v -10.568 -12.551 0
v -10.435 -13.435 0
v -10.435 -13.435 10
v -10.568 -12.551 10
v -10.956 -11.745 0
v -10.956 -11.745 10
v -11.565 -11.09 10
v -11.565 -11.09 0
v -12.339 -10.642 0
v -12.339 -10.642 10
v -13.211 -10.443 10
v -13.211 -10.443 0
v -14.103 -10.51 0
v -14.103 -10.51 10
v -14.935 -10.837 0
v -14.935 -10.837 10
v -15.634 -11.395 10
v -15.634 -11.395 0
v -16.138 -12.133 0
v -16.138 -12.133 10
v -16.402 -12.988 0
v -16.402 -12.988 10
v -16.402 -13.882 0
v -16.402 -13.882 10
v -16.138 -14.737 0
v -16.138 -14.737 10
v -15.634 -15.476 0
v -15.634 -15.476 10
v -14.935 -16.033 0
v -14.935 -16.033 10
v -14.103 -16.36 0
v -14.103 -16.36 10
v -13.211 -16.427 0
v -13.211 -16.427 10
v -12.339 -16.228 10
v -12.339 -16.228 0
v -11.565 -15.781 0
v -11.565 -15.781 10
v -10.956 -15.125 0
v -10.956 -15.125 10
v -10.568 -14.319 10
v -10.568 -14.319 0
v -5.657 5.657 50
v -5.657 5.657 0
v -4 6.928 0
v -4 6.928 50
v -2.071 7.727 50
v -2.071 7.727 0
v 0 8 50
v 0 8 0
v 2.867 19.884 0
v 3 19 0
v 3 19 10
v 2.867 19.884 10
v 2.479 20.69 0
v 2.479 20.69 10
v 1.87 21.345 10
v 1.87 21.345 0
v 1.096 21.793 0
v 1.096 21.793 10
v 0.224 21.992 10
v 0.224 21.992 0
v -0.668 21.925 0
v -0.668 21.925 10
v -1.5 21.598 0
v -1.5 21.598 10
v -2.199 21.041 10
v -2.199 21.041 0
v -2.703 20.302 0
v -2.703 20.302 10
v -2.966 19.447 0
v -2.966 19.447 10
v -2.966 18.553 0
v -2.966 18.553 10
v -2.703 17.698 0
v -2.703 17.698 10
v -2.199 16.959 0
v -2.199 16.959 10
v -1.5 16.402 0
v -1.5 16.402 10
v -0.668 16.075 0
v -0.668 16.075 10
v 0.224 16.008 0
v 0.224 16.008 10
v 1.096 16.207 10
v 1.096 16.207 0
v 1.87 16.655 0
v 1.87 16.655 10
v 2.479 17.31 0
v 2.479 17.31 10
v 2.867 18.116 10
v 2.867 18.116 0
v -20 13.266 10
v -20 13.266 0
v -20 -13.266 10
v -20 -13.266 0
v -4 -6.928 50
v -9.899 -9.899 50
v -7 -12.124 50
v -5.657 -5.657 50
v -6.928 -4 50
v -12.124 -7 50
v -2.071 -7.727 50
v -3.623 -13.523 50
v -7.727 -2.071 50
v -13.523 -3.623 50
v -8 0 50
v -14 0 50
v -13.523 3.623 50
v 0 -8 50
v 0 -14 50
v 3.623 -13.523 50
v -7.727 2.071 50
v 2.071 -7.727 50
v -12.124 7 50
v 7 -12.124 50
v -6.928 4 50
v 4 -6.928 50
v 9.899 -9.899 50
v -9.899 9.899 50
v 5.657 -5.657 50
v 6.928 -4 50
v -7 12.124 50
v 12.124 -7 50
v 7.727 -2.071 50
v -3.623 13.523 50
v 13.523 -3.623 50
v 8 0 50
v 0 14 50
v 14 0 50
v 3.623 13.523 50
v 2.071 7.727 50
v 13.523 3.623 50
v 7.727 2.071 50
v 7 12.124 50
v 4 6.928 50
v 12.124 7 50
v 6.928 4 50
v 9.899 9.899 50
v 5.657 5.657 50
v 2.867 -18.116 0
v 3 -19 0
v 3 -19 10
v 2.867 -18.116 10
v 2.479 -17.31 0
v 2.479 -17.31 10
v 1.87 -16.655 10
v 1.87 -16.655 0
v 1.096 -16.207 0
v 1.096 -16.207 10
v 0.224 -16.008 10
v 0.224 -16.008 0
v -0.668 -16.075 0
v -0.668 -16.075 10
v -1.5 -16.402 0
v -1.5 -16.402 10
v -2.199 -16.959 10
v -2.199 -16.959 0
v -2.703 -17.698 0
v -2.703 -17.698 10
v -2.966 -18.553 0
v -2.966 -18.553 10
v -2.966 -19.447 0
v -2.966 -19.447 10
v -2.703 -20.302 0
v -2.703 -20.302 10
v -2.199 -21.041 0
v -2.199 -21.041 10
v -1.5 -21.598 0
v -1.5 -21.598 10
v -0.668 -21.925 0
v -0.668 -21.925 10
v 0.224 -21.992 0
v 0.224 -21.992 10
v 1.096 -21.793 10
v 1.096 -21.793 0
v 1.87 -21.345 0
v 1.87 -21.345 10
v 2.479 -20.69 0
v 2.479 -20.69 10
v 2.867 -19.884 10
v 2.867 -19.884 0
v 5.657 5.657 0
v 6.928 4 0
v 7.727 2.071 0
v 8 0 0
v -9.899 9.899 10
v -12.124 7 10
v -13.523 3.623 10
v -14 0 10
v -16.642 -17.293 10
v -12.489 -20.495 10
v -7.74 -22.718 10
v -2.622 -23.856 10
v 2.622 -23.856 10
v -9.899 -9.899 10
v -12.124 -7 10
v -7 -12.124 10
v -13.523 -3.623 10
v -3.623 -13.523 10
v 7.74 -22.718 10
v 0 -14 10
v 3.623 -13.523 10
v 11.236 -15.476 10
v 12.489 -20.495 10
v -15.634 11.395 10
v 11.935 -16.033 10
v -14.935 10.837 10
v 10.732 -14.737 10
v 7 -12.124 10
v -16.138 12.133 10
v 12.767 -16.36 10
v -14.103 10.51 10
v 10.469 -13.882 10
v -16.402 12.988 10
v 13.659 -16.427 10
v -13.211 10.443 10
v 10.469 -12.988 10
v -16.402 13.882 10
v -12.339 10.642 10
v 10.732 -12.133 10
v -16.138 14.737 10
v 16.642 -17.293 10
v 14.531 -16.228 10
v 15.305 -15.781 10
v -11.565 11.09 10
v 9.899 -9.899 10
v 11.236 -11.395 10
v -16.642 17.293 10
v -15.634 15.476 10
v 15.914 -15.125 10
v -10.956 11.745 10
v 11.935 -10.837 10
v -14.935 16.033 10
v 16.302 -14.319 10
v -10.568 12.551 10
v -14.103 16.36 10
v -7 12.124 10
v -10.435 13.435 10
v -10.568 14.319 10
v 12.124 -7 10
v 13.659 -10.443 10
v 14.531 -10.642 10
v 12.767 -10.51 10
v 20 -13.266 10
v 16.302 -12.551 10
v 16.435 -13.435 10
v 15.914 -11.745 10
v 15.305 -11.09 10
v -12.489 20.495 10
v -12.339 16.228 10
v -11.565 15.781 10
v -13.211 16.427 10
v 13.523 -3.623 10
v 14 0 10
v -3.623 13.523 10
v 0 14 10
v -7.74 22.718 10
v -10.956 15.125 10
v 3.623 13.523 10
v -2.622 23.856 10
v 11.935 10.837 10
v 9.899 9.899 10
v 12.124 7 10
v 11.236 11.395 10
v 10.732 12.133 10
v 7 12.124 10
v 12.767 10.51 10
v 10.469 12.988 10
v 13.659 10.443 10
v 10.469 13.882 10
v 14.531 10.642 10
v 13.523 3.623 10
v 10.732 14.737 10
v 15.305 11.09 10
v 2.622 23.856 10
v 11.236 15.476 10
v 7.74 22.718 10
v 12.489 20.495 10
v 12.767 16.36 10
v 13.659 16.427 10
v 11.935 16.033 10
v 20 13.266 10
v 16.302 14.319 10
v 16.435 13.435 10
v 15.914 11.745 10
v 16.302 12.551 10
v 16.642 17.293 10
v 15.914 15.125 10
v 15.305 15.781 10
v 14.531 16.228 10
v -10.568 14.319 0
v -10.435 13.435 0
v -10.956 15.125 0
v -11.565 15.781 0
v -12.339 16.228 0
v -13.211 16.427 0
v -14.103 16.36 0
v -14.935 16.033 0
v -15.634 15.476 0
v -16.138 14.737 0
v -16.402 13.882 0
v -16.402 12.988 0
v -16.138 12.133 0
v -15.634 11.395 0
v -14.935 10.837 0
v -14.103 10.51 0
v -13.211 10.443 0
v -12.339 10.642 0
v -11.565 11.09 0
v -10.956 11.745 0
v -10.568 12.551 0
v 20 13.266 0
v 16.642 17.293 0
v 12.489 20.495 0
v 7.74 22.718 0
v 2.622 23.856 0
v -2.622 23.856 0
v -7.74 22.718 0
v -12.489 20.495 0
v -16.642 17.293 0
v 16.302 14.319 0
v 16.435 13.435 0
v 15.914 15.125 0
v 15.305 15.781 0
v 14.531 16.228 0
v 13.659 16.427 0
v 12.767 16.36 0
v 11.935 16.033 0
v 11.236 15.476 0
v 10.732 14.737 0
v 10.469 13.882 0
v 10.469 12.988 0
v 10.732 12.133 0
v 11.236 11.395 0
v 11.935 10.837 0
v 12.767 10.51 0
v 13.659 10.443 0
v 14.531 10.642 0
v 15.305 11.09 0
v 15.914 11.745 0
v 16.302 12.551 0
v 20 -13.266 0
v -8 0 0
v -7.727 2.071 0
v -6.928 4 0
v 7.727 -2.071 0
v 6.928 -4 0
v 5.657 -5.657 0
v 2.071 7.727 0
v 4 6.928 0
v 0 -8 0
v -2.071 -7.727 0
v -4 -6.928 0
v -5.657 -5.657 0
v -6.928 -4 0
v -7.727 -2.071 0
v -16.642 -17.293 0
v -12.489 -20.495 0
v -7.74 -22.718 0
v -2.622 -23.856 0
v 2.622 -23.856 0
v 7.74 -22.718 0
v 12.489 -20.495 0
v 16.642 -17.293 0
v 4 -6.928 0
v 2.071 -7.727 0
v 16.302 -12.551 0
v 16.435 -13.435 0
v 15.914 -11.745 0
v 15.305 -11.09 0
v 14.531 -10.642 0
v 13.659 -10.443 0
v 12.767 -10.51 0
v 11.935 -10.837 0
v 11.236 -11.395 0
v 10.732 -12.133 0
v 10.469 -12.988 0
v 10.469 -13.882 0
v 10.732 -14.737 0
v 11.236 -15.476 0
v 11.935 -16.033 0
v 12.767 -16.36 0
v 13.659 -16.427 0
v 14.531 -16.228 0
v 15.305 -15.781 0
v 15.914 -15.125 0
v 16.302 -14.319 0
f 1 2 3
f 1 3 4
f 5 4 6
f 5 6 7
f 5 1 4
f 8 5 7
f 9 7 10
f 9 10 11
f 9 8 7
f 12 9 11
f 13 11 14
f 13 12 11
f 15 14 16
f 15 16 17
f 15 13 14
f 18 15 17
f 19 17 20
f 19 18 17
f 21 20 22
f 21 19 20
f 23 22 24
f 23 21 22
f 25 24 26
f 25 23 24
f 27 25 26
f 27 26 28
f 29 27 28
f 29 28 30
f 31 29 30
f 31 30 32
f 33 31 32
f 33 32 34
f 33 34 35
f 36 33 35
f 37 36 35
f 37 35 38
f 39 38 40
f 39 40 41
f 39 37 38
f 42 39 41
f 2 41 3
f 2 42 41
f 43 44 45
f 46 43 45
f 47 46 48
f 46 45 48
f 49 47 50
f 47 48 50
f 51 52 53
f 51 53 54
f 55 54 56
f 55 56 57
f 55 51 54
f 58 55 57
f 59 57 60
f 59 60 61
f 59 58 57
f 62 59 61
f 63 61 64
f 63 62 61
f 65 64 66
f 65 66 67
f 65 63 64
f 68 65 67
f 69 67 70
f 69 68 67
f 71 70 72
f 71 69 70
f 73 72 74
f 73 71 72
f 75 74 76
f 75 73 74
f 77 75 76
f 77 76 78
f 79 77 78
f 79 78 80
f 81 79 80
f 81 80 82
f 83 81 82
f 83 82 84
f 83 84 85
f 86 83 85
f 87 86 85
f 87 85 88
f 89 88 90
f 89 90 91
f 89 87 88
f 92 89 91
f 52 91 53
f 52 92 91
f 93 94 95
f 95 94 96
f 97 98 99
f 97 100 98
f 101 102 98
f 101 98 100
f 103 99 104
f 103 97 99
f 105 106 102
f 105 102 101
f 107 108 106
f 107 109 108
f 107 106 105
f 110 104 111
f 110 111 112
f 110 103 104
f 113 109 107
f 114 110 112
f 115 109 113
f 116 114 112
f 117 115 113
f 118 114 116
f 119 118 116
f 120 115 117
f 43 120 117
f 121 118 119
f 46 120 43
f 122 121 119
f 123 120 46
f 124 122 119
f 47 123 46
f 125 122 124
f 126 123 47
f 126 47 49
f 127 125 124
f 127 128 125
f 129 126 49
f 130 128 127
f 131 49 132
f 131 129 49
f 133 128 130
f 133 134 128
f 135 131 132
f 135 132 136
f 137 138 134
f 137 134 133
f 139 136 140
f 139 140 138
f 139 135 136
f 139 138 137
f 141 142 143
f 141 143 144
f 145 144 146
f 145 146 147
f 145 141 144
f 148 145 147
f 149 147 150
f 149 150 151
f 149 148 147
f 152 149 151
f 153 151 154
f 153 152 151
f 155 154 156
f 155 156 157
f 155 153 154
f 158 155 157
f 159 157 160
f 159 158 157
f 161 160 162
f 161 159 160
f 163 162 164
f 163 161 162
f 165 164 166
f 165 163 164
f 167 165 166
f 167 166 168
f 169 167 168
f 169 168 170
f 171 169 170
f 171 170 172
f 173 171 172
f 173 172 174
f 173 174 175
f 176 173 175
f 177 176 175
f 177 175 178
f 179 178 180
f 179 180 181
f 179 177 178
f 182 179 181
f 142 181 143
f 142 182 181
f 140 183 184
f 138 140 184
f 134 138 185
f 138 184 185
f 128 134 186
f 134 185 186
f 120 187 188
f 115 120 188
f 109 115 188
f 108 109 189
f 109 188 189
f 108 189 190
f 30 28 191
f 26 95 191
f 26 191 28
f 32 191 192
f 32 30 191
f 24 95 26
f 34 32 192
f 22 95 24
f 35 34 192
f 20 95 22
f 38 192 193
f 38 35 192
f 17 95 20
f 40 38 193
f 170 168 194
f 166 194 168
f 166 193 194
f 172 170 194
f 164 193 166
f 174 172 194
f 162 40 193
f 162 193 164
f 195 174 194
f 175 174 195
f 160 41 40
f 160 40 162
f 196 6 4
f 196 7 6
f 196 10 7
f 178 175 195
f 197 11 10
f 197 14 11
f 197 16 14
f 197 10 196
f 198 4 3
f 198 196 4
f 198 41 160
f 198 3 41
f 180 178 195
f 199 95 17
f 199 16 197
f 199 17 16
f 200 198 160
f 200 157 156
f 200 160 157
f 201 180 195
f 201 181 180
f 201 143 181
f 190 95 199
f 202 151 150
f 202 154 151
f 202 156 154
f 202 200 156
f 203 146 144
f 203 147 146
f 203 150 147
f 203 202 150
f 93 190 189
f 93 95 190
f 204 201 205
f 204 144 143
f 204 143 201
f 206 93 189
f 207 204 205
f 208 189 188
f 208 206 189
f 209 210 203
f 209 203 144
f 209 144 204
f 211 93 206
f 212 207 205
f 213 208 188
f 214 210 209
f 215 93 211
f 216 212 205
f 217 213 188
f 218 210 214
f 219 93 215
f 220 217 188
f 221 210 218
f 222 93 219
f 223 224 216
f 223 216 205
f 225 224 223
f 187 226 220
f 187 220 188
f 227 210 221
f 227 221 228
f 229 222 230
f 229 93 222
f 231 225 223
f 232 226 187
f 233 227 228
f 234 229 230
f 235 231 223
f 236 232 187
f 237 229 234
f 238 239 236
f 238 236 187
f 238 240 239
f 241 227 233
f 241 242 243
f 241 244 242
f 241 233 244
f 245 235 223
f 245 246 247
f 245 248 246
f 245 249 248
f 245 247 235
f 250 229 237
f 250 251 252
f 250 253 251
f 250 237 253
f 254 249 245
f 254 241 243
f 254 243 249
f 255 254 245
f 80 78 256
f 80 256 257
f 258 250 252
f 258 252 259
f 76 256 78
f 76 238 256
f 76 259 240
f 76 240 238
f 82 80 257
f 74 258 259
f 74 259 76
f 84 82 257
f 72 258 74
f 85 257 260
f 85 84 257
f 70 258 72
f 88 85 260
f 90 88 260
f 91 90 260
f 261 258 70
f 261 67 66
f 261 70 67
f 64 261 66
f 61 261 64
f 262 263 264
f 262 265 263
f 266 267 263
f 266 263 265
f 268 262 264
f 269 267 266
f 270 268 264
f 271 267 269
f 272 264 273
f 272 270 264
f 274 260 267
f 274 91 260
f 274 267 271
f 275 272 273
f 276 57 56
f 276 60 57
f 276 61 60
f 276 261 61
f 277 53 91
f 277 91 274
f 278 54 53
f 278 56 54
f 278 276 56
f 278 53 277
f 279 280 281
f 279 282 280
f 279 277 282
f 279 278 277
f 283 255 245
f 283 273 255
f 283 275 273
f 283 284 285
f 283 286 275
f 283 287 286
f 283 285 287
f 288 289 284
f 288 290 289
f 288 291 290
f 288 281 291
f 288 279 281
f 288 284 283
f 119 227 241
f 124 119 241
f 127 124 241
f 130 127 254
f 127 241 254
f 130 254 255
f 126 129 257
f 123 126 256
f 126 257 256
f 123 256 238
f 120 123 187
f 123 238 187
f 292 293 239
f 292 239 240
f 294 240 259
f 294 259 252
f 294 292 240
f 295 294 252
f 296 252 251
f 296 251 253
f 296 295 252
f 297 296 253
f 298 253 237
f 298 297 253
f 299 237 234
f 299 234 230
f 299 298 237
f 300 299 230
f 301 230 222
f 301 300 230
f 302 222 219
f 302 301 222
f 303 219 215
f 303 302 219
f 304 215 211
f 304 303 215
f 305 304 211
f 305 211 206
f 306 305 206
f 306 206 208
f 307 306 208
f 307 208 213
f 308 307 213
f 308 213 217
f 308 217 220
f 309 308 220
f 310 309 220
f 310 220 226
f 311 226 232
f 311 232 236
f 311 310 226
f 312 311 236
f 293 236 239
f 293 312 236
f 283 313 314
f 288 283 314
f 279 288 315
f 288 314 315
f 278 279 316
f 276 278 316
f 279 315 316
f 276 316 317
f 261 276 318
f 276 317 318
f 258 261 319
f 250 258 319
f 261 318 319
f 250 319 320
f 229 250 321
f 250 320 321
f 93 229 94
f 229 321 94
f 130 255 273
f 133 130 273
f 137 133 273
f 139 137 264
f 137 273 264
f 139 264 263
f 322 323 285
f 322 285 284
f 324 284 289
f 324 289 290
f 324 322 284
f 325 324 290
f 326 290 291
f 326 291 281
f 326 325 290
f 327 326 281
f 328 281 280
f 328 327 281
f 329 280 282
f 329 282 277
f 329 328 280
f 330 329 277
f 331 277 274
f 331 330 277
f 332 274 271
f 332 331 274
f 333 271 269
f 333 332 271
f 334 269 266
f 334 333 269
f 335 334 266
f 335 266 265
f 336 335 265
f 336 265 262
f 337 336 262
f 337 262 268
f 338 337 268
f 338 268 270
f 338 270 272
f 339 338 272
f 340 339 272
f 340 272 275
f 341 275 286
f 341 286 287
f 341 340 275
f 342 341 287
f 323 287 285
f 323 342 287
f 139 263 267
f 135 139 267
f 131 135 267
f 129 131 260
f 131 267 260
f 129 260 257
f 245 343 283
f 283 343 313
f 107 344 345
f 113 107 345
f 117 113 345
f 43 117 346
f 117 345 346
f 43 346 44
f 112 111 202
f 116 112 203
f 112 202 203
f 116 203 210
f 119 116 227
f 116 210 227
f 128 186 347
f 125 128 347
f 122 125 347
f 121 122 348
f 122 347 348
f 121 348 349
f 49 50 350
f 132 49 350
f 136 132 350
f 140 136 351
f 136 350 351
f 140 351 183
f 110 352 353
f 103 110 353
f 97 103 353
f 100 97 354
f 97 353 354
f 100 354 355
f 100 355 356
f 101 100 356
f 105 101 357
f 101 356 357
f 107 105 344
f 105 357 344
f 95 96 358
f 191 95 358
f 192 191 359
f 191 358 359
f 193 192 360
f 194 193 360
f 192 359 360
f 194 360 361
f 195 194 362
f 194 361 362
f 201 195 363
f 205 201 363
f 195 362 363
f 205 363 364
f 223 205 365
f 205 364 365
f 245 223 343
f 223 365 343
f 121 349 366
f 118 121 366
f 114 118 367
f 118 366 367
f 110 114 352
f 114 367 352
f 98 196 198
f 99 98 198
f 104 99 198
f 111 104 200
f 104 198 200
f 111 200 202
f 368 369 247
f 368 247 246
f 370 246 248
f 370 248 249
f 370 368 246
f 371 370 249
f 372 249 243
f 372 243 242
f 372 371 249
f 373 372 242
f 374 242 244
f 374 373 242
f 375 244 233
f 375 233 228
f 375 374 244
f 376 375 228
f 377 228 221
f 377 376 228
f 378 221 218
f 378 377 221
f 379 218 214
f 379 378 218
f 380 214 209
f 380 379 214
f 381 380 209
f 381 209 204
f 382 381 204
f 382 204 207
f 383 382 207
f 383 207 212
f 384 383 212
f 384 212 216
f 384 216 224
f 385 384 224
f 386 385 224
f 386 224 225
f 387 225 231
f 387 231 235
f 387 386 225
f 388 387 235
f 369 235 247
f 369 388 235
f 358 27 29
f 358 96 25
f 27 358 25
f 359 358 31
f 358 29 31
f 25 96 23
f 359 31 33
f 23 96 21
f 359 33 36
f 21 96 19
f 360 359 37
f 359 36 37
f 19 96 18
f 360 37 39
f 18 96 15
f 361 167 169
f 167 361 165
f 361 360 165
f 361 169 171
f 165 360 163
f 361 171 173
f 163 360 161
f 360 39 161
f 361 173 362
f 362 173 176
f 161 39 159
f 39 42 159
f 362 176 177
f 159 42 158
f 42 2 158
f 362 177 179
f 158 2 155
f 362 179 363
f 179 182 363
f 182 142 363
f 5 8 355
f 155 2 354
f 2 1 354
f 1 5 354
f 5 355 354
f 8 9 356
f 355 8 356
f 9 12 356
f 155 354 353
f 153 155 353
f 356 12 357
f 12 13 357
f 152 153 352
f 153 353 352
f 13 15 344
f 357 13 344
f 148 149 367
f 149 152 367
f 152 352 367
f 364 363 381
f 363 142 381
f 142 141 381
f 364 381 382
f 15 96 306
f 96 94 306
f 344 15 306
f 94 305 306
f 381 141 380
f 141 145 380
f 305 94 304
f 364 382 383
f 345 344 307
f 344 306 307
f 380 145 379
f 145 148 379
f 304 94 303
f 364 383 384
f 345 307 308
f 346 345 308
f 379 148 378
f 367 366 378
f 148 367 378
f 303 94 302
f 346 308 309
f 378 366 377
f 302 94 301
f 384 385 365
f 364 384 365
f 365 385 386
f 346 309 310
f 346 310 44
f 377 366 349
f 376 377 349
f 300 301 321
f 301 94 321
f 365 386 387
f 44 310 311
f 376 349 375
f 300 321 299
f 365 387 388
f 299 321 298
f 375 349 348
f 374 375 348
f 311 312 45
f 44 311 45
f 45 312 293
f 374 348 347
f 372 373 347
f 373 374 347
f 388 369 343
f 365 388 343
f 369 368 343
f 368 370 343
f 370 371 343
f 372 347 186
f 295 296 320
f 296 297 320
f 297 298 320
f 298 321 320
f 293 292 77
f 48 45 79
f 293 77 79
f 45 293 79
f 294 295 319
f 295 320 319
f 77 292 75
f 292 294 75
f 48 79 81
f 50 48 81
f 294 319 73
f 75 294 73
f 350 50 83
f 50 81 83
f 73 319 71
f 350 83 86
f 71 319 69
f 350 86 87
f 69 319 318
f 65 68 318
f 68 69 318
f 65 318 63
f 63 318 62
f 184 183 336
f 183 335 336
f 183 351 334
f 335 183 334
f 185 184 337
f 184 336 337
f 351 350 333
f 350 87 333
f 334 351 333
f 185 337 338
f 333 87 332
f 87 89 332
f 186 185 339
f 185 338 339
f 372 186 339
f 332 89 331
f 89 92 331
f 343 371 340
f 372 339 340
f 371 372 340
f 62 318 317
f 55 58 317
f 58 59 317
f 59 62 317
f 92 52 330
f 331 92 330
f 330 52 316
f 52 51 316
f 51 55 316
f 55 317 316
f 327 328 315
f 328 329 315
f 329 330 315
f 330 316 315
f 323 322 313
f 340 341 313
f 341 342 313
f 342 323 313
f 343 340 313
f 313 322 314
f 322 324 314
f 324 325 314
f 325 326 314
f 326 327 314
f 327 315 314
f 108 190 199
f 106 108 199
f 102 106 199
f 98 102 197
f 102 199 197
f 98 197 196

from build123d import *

# Parameters (mm, degrees)
SKETCH1_R      = 3
EXTRUDE4_DEPTH = 10
EXTRUDE5_DEPTH = 50


with BuildPart() as part:
    # Sketch1 → Extrude4 (new body)
    with BuildSketch(Plane.XY):
        with BuildLine():
            Line((-20, 13.266499161), (-20, -13.266499161))
            ThreePointArc((-20, -13.266499161), (0, -24), (20, -13.266499161))
            Line((20, -13.266499161), (20, 13.266499161))
            ThreePointArc((20, 13.266499161), (0, 24), (-20, 13.266499161))
        make_face()
        with BuildLine():
            ThreePointArc((-9.899494937, 9.899494937), (-5.357568053, 12.934313455), (0, 14))
            ThreePointArc((0, 14), (5.357568053, 12.934313455), (9.899494937, 9.899494937))
            ThreePointArc((9.899494937, 9.899494937), (14, 0), (9.899494937, -9.899494937))
            ThreePointArc((9.899494937, -9.899494937), (5.357568053, -12.934313455), (0, -14))
            ThreePointArc((0, -14), (-5.357568053, -12.934313455), (-9.899494937, -9.899494937))
            ThreePointArc((-9.899494937, -9.899494937), (-14, 0), (-9.899494937, 9.899494937))
        make_face(mode=Mode.SUBTRACT)
        with Locations((-13.435028843, 13.435028843)):
            Circle(SKETCH1_R, mode=Mode.SUBTRACT)
        with Locations((0, 19)):
            Circle(SKETCH1_R, mode=Mode.SUBTRACT)
        with Locations((13.435028843, 13.435028843)):
            Circle(SKETCH1_R, mode=Mode.SUBTRACT)
        with Locations((-13.435028843, -13.435028843)):
            Circle(SKETCH1_R, mode=Mode.SUBTRACT)
        with Locations((0, -19)):
            Circle(SKETCH1_R, mode=Mode.SUBTRACT)
        with Locations((13.435028843, -13.435028843)):
            Circle(SKETCH1_R, mode=Mode.SUBTRACT)
    extrude(amount=EXTRUDE4_DEPTH)

    # Sketch1<5> → Extrude5 (add)
    with BuildSketch(Plane.XY):
        with BuildLine():
            Line((0, 14), (0, 8))
            ThreePointArc((0, 8), (3.061467459, 7.39103626), (5.656854249, 5.656854249))
            Line((5.656854249, 5.656854249), (9.899494937, 9.899494937))
            ThreePointArc((9.899494937, 9.899494937), (5.357568053, 12.934313455), (0, 14))
        make_face()
        with BuildLine():
            ThreePointArc((-5.656854249, 5.656854249), (-3.061467459, 7.39103626), (0, 8))
            Line((0, 8), (0, 14))
            ThreePointArc((0, 14), (-5.357568053, 12.934313455), (-9.899494937, 9.899494937))
            Line((-9.899494937, 9.899494937), (-5.656854249, 5.656854249))
        make_face()
        with BuildLine():
            Line((9.899494937, 9.899494937), (5.656854249, 5.656854249))
            ThreePointArc((5.656854249, 5.656854249), (7.39103626, 3.061467459), (8, 0))
            Line((8, 0), (14, 0))
            ThreePointArc((14, 0), (12.934313455, 5.357568053), (9.899494937, 9.899494937))
        make_face()
        with BuildLine():
            ThreePointArc((8, 0), (7.39103626, -3.061467459), (5.656854249, -5.656854249))
            Line((5.656854249, -5.656854249), (9.899494937, -9.899494937))
            ThreePointArc((9.899494937, -9.899494937), (12.934313455, -5.357568053), (14, 0))
            Line((14, 0), (8, 0))
        make_face()
        with BuildLine():
            ThreePointArc((5.656854249, -5.656854249), (3.061467459, -7.39103626), (0, -8))
            Line((0, -8), (0, -14))
            ThreePointArc((0, -14), (5.357568053, -12.934313455), (9.899494937, -9.899494937))
            Line((9.899494937, -9.899494937), (5.656854249, -5.656854249))
        make_face()
        with BuildLine():
            Line((0, -14), (0, -8))
            ThreePointArc((0, -8), (-3.061467459, -7.39103626), (-5.656854249, -5.656854249))
            Line((-5.656854249, -5.656854249), (-9.899494937, -9.899494937))
            ThreePointArc((-9.899494937, -9.899494937), (-5.357568053, -12.934313455), (0, -14))
        make_face()
        with BuildLine():
            Line((-9.899494937, -9.899494937), (-5.656854249, -5.656854249))
            ThreePointArc((-5.656854249, -5.656854249), (-7.39103626, -3.061467459), (-8, 0))
            Line((-8, 0), (-14, 0))
            ThreePointArc((-14, 0), (-12.934313455, -5.357568053), (-9.899494937, -9.899494937))
        make_face()
        with BuildLine():
            ThreePointArc((-8, 0), (-7.39103626, 3.061467459), (-5.656854249, 5.656854249))
            Line((-5.656854249, 5.656854249), (-9.899494937, 9.899494937))
            ThreePointArc((-9.899494937, 9.899494937), (-12.934313455, 5.357568053), (-14, 0))
            Line((-14, 0), (-8, 0))
        make_face()
    extrude(amount=EXTRUDE5_DEPTH)


solid = part.part
